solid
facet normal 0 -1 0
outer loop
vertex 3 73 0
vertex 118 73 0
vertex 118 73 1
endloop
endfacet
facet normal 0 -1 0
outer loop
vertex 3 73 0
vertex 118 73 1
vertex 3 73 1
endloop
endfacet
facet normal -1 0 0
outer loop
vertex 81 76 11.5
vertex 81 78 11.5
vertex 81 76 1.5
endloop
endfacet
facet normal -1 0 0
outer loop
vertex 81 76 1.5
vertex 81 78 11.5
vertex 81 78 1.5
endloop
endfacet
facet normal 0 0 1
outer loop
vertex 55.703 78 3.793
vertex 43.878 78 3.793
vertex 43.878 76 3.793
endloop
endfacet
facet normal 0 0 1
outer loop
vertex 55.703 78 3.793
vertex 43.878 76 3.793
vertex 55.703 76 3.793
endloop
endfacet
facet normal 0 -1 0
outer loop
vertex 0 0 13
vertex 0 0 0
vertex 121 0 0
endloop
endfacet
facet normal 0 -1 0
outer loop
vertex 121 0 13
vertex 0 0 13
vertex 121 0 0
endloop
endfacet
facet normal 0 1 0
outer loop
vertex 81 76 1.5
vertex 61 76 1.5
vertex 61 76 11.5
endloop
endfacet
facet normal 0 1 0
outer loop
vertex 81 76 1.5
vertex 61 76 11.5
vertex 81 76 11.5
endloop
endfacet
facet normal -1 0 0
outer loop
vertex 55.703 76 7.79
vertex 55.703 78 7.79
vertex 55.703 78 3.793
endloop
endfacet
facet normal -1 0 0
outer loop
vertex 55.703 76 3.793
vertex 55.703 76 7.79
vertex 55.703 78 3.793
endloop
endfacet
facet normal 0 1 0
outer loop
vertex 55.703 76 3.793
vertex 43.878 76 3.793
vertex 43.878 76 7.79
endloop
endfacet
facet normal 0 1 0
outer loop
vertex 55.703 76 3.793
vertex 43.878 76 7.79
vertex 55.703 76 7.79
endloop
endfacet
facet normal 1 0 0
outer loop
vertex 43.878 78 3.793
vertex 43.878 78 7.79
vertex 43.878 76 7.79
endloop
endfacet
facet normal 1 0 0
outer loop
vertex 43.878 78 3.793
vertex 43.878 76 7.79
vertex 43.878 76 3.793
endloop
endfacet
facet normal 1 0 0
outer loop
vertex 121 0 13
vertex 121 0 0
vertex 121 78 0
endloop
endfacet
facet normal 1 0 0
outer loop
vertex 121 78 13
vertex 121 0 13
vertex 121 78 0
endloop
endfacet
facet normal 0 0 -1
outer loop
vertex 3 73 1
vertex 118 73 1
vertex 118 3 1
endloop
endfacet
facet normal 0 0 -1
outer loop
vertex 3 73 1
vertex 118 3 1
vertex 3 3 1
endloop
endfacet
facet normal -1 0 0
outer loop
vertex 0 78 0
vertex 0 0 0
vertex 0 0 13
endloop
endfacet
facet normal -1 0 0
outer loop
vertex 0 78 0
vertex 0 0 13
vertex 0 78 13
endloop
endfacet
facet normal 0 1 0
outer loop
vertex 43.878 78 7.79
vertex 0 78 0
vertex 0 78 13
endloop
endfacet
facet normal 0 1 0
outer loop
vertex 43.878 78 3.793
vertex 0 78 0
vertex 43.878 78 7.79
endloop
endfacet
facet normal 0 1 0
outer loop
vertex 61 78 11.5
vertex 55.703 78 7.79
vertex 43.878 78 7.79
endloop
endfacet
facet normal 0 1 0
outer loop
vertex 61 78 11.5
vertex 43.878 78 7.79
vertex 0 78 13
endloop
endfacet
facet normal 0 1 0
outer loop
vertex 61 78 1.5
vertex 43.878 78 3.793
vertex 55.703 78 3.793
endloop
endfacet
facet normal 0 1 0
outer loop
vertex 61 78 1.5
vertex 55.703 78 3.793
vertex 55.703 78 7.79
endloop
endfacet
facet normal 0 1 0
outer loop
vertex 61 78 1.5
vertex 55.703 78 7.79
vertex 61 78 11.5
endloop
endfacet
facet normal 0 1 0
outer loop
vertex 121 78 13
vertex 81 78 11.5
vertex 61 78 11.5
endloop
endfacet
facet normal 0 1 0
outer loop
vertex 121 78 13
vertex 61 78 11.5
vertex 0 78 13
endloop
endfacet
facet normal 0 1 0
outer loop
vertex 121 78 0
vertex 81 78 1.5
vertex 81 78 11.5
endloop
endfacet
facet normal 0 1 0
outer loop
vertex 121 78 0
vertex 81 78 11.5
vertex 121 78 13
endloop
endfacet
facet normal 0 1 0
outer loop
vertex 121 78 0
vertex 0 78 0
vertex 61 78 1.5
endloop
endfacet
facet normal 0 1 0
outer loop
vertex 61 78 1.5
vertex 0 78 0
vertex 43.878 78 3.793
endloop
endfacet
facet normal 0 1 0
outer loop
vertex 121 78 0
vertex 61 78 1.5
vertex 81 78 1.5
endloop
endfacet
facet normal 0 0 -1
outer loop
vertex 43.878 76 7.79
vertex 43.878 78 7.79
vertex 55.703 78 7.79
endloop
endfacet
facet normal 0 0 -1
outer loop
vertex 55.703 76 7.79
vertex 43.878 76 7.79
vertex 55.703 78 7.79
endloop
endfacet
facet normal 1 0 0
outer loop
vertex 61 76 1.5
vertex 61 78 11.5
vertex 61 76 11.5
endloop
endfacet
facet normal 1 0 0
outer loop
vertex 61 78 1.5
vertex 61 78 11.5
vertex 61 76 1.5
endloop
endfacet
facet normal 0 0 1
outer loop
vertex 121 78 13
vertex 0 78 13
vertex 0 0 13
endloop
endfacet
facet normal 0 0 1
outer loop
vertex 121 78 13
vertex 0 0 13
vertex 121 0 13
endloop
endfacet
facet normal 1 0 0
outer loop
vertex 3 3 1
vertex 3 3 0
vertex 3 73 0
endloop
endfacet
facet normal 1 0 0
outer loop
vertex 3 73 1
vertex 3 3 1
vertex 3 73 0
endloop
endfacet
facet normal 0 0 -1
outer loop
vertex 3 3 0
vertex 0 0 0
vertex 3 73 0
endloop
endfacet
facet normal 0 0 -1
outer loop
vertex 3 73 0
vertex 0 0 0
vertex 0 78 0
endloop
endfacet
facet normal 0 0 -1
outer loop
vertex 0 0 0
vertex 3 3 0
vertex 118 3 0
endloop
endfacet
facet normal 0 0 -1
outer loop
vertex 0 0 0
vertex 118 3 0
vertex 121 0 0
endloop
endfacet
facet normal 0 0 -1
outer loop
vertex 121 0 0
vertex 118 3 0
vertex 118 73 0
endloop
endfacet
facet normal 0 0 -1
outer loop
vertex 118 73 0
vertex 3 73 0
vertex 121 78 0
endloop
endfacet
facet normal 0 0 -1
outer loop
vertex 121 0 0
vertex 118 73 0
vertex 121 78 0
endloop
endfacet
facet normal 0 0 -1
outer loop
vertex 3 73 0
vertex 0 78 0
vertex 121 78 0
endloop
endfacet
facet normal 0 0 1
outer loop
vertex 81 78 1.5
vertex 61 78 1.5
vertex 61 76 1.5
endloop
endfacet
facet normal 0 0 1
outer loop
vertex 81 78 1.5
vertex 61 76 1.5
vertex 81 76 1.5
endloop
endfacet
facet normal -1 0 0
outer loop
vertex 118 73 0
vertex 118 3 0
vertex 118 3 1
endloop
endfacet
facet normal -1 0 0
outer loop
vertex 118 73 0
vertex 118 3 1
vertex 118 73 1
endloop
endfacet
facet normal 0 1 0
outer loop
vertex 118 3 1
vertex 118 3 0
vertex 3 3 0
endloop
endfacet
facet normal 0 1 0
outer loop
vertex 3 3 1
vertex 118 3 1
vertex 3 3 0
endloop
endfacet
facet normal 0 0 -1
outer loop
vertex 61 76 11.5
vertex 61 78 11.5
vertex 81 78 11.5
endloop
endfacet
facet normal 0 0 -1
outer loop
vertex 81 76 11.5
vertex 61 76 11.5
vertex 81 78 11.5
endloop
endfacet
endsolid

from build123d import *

# Parameters (mm, degrees)
SKETCH1_W           = 121
SKETCH1_H           = 78
BOSS_EXTRUDE1_DEPTH = 13
SKETCH2_W           = 115
SKETCH2_H           = 70
CUT_EXTRUDE1_DEPTH  = 1
SKETCH4_W           = 20
SKETCH4_H           = 10
SKETCH4_W_2         = 11.824806853
SKETCH4_H_2         = 3.99711781
CUT_EXTRUDE2_DEPTH  = 2


with BuildPart() as part:
    # Sketch1 → Boss-Extrude1 (new body)
    with BuildSketch(Plane.XY):
        with Locations((60.5, 39)):
            Rectangle(SKETCH1_W, SKETCH1_H)
    extrude(amount=BOSS_EXTRUDE1_DEPTH)

    # Sketch2 → Cut-Extrude1 (cut)
    with BuildSketch(Plane(origin=(0, 0, 0), x_dir=(-1, 0, 0), z_dir=(0, 0, -1))):
        with Locations((-60.5, 38)):
            Rectangle(SKETCH2_W, SKETCH2_H)
    extrude(amount=-CUT_EXTRUDE1_DEPTH, mode=Mode.SUBTRACT)

    # Sketch4 → Cut-Extrude2 (cut)
    with BuildSketch(Plane(origin=(0, 78, 0), x_dir=(1, 0, 0), z_dir=(0, 1, 0))):
        with Locations((71, -6.5)):
            Rectangle(SKETCH4_W, SKETCH4_H)
        with Locations((49.790852201, -5.791105027)):
            Rectangle(SKETCH4_W_2, SKETCH4_H_2)
    extrude(amount=-CUT_EXTRUDE2_DEPTH, mode=Mode.SUBTRACT)


solid = part.part
